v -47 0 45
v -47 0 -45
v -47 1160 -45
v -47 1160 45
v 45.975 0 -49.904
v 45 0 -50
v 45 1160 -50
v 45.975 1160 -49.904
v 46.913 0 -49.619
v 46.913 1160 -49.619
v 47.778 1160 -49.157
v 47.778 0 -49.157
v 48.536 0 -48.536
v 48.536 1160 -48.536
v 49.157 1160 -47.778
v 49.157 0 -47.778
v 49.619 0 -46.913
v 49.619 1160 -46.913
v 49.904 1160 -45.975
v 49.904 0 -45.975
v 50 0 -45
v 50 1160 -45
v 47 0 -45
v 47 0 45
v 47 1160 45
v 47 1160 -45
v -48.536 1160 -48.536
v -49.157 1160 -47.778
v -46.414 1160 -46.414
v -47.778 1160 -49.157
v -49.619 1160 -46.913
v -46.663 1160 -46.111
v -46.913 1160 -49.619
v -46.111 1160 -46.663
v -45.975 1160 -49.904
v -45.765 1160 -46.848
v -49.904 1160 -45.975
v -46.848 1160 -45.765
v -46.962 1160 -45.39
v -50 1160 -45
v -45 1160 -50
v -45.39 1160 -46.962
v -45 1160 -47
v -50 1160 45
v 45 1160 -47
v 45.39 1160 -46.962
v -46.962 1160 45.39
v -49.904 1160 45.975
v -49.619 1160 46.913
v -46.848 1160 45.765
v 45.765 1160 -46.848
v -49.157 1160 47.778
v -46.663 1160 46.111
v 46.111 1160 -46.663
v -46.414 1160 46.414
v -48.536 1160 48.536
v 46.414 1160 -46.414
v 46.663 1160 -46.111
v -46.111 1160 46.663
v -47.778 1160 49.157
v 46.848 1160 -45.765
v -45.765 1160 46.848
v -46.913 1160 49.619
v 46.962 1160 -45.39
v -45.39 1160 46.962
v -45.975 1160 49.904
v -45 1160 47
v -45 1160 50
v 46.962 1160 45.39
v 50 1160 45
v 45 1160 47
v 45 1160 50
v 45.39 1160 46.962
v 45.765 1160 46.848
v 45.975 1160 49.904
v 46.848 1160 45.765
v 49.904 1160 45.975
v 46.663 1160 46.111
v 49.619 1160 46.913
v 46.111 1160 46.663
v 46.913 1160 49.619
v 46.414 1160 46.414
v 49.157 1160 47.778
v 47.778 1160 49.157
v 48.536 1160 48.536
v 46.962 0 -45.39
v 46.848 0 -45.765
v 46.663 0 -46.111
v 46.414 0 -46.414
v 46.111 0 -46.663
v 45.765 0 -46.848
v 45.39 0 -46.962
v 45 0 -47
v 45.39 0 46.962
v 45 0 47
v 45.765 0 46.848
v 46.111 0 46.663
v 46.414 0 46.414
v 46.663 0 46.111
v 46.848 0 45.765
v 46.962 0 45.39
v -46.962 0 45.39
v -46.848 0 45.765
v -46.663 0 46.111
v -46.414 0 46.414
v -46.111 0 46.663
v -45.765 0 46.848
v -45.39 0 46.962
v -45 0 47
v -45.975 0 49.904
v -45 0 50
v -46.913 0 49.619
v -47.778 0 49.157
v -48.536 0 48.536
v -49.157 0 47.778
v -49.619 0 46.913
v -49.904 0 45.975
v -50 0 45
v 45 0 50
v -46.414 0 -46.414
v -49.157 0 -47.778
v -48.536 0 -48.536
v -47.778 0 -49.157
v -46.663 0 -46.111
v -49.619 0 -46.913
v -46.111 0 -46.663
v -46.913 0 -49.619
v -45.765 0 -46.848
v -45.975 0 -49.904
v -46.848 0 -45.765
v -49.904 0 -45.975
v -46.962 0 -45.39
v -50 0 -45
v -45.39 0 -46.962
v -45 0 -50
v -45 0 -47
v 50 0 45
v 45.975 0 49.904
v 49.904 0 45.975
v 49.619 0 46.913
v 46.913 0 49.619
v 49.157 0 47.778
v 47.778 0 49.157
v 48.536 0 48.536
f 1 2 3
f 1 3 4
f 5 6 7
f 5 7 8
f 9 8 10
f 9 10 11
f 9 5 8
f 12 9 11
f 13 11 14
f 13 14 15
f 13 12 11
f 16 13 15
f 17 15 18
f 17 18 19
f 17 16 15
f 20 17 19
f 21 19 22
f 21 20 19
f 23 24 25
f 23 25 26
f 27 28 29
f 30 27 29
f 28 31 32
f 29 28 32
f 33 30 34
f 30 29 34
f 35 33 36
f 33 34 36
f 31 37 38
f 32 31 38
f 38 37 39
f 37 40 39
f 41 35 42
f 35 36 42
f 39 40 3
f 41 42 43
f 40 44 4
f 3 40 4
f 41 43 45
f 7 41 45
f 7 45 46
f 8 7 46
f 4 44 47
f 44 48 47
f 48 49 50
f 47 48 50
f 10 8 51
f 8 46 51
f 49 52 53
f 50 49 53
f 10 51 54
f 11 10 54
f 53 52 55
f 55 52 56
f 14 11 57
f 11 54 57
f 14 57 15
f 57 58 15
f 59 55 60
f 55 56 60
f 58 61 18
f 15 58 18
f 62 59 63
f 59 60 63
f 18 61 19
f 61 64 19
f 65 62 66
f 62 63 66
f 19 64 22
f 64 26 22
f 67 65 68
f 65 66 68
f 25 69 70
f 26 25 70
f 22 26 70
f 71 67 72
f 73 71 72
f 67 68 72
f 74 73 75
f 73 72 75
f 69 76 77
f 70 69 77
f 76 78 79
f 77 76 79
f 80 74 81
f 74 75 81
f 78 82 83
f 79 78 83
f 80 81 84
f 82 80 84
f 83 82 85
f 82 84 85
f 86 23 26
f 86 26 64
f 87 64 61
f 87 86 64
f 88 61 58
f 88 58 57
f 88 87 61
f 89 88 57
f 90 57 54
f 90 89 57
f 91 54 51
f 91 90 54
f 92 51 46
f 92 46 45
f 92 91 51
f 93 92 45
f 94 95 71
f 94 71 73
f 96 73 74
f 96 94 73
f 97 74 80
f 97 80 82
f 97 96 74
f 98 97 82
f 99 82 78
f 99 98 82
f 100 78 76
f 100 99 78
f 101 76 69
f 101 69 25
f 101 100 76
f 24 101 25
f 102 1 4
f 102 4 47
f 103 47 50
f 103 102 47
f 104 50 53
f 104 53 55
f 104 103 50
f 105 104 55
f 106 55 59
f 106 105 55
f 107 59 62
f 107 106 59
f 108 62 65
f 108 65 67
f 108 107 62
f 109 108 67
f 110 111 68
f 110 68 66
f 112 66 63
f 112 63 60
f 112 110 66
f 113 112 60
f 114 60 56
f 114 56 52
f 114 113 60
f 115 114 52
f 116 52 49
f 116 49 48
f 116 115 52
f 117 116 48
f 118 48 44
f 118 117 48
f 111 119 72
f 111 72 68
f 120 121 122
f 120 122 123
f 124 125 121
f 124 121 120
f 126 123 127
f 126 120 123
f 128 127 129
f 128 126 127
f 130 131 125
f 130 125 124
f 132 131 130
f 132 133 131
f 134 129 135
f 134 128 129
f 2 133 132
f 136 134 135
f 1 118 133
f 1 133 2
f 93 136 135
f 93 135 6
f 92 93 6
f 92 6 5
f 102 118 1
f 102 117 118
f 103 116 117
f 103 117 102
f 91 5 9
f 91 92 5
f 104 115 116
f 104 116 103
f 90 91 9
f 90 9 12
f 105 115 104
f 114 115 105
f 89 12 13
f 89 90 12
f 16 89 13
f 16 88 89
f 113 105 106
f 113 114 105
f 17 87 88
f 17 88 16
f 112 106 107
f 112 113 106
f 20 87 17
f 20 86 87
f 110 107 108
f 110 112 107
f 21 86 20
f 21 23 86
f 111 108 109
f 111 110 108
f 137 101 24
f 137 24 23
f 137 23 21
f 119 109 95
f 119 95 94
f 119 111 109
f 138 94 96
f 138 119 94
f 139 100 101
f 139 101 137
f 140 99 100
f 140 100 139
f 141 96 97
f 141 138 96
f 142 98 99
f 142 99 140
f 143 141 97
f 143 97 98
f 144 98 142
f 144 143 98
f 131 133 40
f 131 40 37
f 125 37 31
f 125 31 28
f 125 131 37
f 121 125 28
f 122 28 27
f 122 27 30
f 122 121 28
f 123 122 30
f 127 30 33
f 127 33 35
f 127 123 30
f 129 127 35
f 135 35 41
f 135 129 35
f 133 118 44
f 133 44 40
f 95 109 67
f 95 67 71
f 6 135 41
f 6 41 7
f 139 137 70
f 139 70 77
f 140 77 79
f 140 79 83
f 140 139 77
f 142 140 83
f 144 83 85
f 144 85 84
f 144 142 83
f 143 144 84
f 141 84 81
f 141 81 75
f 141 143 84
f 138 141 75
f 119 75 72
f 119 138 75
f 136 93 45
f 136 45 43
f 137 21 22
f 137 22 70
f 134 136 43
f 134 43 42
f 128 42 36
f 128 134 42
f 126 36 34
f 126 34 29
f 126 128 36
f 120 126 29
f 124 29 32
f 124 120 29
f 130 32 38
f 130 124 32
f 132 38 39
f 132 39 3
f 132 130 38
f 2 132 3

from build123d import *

# Parameters (mm, degrees)
F1_DEPTH = 1160


with BuildPart() as f1:
    # F0 (on Front) → F1 (new body)
    with BuildSketch(Plane.XZ):
        with BuildLine():
            ThreePointArc((50, 45), (48.535534, 48.535534), (45, 50))
            Line((45, 50), (-45, 50))
            ThreePointArc((-45, 50), (-48.535534, 48.535534), (-50, 45))
            Line((-50, 45), (-50, -45))
            ThreePointArc((-50, -45), (-48.535534, -48.535534), (-45, -50))
            Line((-45, -50), (45, -50))
            ThreePointArc((45, -50), (48.535534, -48.535534), (50, -45))
            Line((50, -45), (50, 45))
        make_face()
        with BuildLine():
            ThreePointArc((-47, 45), (-46.414214, 46.414214), (-45, 47))
            Line((-45, 47), (45, 47))
            ThreePointArc((45, 47), (46.414214, 46.414214), (47, 45))
            Line((47, 45), (47, -45))
            ThreePointArc((47, -45), (46.414214, -46.414214), (45, -47))
            Line((45, -47), (-45, -47))
            ThreePointArc((-45, -47), (-46.414214, -46.414214), (-47, -45))
            Line((-47, -45), (-47, 45))
        make_face(mode=Mode.SUBTRACT)
    extrude(amount=-F1_DEPTH)


solid = f1.part
